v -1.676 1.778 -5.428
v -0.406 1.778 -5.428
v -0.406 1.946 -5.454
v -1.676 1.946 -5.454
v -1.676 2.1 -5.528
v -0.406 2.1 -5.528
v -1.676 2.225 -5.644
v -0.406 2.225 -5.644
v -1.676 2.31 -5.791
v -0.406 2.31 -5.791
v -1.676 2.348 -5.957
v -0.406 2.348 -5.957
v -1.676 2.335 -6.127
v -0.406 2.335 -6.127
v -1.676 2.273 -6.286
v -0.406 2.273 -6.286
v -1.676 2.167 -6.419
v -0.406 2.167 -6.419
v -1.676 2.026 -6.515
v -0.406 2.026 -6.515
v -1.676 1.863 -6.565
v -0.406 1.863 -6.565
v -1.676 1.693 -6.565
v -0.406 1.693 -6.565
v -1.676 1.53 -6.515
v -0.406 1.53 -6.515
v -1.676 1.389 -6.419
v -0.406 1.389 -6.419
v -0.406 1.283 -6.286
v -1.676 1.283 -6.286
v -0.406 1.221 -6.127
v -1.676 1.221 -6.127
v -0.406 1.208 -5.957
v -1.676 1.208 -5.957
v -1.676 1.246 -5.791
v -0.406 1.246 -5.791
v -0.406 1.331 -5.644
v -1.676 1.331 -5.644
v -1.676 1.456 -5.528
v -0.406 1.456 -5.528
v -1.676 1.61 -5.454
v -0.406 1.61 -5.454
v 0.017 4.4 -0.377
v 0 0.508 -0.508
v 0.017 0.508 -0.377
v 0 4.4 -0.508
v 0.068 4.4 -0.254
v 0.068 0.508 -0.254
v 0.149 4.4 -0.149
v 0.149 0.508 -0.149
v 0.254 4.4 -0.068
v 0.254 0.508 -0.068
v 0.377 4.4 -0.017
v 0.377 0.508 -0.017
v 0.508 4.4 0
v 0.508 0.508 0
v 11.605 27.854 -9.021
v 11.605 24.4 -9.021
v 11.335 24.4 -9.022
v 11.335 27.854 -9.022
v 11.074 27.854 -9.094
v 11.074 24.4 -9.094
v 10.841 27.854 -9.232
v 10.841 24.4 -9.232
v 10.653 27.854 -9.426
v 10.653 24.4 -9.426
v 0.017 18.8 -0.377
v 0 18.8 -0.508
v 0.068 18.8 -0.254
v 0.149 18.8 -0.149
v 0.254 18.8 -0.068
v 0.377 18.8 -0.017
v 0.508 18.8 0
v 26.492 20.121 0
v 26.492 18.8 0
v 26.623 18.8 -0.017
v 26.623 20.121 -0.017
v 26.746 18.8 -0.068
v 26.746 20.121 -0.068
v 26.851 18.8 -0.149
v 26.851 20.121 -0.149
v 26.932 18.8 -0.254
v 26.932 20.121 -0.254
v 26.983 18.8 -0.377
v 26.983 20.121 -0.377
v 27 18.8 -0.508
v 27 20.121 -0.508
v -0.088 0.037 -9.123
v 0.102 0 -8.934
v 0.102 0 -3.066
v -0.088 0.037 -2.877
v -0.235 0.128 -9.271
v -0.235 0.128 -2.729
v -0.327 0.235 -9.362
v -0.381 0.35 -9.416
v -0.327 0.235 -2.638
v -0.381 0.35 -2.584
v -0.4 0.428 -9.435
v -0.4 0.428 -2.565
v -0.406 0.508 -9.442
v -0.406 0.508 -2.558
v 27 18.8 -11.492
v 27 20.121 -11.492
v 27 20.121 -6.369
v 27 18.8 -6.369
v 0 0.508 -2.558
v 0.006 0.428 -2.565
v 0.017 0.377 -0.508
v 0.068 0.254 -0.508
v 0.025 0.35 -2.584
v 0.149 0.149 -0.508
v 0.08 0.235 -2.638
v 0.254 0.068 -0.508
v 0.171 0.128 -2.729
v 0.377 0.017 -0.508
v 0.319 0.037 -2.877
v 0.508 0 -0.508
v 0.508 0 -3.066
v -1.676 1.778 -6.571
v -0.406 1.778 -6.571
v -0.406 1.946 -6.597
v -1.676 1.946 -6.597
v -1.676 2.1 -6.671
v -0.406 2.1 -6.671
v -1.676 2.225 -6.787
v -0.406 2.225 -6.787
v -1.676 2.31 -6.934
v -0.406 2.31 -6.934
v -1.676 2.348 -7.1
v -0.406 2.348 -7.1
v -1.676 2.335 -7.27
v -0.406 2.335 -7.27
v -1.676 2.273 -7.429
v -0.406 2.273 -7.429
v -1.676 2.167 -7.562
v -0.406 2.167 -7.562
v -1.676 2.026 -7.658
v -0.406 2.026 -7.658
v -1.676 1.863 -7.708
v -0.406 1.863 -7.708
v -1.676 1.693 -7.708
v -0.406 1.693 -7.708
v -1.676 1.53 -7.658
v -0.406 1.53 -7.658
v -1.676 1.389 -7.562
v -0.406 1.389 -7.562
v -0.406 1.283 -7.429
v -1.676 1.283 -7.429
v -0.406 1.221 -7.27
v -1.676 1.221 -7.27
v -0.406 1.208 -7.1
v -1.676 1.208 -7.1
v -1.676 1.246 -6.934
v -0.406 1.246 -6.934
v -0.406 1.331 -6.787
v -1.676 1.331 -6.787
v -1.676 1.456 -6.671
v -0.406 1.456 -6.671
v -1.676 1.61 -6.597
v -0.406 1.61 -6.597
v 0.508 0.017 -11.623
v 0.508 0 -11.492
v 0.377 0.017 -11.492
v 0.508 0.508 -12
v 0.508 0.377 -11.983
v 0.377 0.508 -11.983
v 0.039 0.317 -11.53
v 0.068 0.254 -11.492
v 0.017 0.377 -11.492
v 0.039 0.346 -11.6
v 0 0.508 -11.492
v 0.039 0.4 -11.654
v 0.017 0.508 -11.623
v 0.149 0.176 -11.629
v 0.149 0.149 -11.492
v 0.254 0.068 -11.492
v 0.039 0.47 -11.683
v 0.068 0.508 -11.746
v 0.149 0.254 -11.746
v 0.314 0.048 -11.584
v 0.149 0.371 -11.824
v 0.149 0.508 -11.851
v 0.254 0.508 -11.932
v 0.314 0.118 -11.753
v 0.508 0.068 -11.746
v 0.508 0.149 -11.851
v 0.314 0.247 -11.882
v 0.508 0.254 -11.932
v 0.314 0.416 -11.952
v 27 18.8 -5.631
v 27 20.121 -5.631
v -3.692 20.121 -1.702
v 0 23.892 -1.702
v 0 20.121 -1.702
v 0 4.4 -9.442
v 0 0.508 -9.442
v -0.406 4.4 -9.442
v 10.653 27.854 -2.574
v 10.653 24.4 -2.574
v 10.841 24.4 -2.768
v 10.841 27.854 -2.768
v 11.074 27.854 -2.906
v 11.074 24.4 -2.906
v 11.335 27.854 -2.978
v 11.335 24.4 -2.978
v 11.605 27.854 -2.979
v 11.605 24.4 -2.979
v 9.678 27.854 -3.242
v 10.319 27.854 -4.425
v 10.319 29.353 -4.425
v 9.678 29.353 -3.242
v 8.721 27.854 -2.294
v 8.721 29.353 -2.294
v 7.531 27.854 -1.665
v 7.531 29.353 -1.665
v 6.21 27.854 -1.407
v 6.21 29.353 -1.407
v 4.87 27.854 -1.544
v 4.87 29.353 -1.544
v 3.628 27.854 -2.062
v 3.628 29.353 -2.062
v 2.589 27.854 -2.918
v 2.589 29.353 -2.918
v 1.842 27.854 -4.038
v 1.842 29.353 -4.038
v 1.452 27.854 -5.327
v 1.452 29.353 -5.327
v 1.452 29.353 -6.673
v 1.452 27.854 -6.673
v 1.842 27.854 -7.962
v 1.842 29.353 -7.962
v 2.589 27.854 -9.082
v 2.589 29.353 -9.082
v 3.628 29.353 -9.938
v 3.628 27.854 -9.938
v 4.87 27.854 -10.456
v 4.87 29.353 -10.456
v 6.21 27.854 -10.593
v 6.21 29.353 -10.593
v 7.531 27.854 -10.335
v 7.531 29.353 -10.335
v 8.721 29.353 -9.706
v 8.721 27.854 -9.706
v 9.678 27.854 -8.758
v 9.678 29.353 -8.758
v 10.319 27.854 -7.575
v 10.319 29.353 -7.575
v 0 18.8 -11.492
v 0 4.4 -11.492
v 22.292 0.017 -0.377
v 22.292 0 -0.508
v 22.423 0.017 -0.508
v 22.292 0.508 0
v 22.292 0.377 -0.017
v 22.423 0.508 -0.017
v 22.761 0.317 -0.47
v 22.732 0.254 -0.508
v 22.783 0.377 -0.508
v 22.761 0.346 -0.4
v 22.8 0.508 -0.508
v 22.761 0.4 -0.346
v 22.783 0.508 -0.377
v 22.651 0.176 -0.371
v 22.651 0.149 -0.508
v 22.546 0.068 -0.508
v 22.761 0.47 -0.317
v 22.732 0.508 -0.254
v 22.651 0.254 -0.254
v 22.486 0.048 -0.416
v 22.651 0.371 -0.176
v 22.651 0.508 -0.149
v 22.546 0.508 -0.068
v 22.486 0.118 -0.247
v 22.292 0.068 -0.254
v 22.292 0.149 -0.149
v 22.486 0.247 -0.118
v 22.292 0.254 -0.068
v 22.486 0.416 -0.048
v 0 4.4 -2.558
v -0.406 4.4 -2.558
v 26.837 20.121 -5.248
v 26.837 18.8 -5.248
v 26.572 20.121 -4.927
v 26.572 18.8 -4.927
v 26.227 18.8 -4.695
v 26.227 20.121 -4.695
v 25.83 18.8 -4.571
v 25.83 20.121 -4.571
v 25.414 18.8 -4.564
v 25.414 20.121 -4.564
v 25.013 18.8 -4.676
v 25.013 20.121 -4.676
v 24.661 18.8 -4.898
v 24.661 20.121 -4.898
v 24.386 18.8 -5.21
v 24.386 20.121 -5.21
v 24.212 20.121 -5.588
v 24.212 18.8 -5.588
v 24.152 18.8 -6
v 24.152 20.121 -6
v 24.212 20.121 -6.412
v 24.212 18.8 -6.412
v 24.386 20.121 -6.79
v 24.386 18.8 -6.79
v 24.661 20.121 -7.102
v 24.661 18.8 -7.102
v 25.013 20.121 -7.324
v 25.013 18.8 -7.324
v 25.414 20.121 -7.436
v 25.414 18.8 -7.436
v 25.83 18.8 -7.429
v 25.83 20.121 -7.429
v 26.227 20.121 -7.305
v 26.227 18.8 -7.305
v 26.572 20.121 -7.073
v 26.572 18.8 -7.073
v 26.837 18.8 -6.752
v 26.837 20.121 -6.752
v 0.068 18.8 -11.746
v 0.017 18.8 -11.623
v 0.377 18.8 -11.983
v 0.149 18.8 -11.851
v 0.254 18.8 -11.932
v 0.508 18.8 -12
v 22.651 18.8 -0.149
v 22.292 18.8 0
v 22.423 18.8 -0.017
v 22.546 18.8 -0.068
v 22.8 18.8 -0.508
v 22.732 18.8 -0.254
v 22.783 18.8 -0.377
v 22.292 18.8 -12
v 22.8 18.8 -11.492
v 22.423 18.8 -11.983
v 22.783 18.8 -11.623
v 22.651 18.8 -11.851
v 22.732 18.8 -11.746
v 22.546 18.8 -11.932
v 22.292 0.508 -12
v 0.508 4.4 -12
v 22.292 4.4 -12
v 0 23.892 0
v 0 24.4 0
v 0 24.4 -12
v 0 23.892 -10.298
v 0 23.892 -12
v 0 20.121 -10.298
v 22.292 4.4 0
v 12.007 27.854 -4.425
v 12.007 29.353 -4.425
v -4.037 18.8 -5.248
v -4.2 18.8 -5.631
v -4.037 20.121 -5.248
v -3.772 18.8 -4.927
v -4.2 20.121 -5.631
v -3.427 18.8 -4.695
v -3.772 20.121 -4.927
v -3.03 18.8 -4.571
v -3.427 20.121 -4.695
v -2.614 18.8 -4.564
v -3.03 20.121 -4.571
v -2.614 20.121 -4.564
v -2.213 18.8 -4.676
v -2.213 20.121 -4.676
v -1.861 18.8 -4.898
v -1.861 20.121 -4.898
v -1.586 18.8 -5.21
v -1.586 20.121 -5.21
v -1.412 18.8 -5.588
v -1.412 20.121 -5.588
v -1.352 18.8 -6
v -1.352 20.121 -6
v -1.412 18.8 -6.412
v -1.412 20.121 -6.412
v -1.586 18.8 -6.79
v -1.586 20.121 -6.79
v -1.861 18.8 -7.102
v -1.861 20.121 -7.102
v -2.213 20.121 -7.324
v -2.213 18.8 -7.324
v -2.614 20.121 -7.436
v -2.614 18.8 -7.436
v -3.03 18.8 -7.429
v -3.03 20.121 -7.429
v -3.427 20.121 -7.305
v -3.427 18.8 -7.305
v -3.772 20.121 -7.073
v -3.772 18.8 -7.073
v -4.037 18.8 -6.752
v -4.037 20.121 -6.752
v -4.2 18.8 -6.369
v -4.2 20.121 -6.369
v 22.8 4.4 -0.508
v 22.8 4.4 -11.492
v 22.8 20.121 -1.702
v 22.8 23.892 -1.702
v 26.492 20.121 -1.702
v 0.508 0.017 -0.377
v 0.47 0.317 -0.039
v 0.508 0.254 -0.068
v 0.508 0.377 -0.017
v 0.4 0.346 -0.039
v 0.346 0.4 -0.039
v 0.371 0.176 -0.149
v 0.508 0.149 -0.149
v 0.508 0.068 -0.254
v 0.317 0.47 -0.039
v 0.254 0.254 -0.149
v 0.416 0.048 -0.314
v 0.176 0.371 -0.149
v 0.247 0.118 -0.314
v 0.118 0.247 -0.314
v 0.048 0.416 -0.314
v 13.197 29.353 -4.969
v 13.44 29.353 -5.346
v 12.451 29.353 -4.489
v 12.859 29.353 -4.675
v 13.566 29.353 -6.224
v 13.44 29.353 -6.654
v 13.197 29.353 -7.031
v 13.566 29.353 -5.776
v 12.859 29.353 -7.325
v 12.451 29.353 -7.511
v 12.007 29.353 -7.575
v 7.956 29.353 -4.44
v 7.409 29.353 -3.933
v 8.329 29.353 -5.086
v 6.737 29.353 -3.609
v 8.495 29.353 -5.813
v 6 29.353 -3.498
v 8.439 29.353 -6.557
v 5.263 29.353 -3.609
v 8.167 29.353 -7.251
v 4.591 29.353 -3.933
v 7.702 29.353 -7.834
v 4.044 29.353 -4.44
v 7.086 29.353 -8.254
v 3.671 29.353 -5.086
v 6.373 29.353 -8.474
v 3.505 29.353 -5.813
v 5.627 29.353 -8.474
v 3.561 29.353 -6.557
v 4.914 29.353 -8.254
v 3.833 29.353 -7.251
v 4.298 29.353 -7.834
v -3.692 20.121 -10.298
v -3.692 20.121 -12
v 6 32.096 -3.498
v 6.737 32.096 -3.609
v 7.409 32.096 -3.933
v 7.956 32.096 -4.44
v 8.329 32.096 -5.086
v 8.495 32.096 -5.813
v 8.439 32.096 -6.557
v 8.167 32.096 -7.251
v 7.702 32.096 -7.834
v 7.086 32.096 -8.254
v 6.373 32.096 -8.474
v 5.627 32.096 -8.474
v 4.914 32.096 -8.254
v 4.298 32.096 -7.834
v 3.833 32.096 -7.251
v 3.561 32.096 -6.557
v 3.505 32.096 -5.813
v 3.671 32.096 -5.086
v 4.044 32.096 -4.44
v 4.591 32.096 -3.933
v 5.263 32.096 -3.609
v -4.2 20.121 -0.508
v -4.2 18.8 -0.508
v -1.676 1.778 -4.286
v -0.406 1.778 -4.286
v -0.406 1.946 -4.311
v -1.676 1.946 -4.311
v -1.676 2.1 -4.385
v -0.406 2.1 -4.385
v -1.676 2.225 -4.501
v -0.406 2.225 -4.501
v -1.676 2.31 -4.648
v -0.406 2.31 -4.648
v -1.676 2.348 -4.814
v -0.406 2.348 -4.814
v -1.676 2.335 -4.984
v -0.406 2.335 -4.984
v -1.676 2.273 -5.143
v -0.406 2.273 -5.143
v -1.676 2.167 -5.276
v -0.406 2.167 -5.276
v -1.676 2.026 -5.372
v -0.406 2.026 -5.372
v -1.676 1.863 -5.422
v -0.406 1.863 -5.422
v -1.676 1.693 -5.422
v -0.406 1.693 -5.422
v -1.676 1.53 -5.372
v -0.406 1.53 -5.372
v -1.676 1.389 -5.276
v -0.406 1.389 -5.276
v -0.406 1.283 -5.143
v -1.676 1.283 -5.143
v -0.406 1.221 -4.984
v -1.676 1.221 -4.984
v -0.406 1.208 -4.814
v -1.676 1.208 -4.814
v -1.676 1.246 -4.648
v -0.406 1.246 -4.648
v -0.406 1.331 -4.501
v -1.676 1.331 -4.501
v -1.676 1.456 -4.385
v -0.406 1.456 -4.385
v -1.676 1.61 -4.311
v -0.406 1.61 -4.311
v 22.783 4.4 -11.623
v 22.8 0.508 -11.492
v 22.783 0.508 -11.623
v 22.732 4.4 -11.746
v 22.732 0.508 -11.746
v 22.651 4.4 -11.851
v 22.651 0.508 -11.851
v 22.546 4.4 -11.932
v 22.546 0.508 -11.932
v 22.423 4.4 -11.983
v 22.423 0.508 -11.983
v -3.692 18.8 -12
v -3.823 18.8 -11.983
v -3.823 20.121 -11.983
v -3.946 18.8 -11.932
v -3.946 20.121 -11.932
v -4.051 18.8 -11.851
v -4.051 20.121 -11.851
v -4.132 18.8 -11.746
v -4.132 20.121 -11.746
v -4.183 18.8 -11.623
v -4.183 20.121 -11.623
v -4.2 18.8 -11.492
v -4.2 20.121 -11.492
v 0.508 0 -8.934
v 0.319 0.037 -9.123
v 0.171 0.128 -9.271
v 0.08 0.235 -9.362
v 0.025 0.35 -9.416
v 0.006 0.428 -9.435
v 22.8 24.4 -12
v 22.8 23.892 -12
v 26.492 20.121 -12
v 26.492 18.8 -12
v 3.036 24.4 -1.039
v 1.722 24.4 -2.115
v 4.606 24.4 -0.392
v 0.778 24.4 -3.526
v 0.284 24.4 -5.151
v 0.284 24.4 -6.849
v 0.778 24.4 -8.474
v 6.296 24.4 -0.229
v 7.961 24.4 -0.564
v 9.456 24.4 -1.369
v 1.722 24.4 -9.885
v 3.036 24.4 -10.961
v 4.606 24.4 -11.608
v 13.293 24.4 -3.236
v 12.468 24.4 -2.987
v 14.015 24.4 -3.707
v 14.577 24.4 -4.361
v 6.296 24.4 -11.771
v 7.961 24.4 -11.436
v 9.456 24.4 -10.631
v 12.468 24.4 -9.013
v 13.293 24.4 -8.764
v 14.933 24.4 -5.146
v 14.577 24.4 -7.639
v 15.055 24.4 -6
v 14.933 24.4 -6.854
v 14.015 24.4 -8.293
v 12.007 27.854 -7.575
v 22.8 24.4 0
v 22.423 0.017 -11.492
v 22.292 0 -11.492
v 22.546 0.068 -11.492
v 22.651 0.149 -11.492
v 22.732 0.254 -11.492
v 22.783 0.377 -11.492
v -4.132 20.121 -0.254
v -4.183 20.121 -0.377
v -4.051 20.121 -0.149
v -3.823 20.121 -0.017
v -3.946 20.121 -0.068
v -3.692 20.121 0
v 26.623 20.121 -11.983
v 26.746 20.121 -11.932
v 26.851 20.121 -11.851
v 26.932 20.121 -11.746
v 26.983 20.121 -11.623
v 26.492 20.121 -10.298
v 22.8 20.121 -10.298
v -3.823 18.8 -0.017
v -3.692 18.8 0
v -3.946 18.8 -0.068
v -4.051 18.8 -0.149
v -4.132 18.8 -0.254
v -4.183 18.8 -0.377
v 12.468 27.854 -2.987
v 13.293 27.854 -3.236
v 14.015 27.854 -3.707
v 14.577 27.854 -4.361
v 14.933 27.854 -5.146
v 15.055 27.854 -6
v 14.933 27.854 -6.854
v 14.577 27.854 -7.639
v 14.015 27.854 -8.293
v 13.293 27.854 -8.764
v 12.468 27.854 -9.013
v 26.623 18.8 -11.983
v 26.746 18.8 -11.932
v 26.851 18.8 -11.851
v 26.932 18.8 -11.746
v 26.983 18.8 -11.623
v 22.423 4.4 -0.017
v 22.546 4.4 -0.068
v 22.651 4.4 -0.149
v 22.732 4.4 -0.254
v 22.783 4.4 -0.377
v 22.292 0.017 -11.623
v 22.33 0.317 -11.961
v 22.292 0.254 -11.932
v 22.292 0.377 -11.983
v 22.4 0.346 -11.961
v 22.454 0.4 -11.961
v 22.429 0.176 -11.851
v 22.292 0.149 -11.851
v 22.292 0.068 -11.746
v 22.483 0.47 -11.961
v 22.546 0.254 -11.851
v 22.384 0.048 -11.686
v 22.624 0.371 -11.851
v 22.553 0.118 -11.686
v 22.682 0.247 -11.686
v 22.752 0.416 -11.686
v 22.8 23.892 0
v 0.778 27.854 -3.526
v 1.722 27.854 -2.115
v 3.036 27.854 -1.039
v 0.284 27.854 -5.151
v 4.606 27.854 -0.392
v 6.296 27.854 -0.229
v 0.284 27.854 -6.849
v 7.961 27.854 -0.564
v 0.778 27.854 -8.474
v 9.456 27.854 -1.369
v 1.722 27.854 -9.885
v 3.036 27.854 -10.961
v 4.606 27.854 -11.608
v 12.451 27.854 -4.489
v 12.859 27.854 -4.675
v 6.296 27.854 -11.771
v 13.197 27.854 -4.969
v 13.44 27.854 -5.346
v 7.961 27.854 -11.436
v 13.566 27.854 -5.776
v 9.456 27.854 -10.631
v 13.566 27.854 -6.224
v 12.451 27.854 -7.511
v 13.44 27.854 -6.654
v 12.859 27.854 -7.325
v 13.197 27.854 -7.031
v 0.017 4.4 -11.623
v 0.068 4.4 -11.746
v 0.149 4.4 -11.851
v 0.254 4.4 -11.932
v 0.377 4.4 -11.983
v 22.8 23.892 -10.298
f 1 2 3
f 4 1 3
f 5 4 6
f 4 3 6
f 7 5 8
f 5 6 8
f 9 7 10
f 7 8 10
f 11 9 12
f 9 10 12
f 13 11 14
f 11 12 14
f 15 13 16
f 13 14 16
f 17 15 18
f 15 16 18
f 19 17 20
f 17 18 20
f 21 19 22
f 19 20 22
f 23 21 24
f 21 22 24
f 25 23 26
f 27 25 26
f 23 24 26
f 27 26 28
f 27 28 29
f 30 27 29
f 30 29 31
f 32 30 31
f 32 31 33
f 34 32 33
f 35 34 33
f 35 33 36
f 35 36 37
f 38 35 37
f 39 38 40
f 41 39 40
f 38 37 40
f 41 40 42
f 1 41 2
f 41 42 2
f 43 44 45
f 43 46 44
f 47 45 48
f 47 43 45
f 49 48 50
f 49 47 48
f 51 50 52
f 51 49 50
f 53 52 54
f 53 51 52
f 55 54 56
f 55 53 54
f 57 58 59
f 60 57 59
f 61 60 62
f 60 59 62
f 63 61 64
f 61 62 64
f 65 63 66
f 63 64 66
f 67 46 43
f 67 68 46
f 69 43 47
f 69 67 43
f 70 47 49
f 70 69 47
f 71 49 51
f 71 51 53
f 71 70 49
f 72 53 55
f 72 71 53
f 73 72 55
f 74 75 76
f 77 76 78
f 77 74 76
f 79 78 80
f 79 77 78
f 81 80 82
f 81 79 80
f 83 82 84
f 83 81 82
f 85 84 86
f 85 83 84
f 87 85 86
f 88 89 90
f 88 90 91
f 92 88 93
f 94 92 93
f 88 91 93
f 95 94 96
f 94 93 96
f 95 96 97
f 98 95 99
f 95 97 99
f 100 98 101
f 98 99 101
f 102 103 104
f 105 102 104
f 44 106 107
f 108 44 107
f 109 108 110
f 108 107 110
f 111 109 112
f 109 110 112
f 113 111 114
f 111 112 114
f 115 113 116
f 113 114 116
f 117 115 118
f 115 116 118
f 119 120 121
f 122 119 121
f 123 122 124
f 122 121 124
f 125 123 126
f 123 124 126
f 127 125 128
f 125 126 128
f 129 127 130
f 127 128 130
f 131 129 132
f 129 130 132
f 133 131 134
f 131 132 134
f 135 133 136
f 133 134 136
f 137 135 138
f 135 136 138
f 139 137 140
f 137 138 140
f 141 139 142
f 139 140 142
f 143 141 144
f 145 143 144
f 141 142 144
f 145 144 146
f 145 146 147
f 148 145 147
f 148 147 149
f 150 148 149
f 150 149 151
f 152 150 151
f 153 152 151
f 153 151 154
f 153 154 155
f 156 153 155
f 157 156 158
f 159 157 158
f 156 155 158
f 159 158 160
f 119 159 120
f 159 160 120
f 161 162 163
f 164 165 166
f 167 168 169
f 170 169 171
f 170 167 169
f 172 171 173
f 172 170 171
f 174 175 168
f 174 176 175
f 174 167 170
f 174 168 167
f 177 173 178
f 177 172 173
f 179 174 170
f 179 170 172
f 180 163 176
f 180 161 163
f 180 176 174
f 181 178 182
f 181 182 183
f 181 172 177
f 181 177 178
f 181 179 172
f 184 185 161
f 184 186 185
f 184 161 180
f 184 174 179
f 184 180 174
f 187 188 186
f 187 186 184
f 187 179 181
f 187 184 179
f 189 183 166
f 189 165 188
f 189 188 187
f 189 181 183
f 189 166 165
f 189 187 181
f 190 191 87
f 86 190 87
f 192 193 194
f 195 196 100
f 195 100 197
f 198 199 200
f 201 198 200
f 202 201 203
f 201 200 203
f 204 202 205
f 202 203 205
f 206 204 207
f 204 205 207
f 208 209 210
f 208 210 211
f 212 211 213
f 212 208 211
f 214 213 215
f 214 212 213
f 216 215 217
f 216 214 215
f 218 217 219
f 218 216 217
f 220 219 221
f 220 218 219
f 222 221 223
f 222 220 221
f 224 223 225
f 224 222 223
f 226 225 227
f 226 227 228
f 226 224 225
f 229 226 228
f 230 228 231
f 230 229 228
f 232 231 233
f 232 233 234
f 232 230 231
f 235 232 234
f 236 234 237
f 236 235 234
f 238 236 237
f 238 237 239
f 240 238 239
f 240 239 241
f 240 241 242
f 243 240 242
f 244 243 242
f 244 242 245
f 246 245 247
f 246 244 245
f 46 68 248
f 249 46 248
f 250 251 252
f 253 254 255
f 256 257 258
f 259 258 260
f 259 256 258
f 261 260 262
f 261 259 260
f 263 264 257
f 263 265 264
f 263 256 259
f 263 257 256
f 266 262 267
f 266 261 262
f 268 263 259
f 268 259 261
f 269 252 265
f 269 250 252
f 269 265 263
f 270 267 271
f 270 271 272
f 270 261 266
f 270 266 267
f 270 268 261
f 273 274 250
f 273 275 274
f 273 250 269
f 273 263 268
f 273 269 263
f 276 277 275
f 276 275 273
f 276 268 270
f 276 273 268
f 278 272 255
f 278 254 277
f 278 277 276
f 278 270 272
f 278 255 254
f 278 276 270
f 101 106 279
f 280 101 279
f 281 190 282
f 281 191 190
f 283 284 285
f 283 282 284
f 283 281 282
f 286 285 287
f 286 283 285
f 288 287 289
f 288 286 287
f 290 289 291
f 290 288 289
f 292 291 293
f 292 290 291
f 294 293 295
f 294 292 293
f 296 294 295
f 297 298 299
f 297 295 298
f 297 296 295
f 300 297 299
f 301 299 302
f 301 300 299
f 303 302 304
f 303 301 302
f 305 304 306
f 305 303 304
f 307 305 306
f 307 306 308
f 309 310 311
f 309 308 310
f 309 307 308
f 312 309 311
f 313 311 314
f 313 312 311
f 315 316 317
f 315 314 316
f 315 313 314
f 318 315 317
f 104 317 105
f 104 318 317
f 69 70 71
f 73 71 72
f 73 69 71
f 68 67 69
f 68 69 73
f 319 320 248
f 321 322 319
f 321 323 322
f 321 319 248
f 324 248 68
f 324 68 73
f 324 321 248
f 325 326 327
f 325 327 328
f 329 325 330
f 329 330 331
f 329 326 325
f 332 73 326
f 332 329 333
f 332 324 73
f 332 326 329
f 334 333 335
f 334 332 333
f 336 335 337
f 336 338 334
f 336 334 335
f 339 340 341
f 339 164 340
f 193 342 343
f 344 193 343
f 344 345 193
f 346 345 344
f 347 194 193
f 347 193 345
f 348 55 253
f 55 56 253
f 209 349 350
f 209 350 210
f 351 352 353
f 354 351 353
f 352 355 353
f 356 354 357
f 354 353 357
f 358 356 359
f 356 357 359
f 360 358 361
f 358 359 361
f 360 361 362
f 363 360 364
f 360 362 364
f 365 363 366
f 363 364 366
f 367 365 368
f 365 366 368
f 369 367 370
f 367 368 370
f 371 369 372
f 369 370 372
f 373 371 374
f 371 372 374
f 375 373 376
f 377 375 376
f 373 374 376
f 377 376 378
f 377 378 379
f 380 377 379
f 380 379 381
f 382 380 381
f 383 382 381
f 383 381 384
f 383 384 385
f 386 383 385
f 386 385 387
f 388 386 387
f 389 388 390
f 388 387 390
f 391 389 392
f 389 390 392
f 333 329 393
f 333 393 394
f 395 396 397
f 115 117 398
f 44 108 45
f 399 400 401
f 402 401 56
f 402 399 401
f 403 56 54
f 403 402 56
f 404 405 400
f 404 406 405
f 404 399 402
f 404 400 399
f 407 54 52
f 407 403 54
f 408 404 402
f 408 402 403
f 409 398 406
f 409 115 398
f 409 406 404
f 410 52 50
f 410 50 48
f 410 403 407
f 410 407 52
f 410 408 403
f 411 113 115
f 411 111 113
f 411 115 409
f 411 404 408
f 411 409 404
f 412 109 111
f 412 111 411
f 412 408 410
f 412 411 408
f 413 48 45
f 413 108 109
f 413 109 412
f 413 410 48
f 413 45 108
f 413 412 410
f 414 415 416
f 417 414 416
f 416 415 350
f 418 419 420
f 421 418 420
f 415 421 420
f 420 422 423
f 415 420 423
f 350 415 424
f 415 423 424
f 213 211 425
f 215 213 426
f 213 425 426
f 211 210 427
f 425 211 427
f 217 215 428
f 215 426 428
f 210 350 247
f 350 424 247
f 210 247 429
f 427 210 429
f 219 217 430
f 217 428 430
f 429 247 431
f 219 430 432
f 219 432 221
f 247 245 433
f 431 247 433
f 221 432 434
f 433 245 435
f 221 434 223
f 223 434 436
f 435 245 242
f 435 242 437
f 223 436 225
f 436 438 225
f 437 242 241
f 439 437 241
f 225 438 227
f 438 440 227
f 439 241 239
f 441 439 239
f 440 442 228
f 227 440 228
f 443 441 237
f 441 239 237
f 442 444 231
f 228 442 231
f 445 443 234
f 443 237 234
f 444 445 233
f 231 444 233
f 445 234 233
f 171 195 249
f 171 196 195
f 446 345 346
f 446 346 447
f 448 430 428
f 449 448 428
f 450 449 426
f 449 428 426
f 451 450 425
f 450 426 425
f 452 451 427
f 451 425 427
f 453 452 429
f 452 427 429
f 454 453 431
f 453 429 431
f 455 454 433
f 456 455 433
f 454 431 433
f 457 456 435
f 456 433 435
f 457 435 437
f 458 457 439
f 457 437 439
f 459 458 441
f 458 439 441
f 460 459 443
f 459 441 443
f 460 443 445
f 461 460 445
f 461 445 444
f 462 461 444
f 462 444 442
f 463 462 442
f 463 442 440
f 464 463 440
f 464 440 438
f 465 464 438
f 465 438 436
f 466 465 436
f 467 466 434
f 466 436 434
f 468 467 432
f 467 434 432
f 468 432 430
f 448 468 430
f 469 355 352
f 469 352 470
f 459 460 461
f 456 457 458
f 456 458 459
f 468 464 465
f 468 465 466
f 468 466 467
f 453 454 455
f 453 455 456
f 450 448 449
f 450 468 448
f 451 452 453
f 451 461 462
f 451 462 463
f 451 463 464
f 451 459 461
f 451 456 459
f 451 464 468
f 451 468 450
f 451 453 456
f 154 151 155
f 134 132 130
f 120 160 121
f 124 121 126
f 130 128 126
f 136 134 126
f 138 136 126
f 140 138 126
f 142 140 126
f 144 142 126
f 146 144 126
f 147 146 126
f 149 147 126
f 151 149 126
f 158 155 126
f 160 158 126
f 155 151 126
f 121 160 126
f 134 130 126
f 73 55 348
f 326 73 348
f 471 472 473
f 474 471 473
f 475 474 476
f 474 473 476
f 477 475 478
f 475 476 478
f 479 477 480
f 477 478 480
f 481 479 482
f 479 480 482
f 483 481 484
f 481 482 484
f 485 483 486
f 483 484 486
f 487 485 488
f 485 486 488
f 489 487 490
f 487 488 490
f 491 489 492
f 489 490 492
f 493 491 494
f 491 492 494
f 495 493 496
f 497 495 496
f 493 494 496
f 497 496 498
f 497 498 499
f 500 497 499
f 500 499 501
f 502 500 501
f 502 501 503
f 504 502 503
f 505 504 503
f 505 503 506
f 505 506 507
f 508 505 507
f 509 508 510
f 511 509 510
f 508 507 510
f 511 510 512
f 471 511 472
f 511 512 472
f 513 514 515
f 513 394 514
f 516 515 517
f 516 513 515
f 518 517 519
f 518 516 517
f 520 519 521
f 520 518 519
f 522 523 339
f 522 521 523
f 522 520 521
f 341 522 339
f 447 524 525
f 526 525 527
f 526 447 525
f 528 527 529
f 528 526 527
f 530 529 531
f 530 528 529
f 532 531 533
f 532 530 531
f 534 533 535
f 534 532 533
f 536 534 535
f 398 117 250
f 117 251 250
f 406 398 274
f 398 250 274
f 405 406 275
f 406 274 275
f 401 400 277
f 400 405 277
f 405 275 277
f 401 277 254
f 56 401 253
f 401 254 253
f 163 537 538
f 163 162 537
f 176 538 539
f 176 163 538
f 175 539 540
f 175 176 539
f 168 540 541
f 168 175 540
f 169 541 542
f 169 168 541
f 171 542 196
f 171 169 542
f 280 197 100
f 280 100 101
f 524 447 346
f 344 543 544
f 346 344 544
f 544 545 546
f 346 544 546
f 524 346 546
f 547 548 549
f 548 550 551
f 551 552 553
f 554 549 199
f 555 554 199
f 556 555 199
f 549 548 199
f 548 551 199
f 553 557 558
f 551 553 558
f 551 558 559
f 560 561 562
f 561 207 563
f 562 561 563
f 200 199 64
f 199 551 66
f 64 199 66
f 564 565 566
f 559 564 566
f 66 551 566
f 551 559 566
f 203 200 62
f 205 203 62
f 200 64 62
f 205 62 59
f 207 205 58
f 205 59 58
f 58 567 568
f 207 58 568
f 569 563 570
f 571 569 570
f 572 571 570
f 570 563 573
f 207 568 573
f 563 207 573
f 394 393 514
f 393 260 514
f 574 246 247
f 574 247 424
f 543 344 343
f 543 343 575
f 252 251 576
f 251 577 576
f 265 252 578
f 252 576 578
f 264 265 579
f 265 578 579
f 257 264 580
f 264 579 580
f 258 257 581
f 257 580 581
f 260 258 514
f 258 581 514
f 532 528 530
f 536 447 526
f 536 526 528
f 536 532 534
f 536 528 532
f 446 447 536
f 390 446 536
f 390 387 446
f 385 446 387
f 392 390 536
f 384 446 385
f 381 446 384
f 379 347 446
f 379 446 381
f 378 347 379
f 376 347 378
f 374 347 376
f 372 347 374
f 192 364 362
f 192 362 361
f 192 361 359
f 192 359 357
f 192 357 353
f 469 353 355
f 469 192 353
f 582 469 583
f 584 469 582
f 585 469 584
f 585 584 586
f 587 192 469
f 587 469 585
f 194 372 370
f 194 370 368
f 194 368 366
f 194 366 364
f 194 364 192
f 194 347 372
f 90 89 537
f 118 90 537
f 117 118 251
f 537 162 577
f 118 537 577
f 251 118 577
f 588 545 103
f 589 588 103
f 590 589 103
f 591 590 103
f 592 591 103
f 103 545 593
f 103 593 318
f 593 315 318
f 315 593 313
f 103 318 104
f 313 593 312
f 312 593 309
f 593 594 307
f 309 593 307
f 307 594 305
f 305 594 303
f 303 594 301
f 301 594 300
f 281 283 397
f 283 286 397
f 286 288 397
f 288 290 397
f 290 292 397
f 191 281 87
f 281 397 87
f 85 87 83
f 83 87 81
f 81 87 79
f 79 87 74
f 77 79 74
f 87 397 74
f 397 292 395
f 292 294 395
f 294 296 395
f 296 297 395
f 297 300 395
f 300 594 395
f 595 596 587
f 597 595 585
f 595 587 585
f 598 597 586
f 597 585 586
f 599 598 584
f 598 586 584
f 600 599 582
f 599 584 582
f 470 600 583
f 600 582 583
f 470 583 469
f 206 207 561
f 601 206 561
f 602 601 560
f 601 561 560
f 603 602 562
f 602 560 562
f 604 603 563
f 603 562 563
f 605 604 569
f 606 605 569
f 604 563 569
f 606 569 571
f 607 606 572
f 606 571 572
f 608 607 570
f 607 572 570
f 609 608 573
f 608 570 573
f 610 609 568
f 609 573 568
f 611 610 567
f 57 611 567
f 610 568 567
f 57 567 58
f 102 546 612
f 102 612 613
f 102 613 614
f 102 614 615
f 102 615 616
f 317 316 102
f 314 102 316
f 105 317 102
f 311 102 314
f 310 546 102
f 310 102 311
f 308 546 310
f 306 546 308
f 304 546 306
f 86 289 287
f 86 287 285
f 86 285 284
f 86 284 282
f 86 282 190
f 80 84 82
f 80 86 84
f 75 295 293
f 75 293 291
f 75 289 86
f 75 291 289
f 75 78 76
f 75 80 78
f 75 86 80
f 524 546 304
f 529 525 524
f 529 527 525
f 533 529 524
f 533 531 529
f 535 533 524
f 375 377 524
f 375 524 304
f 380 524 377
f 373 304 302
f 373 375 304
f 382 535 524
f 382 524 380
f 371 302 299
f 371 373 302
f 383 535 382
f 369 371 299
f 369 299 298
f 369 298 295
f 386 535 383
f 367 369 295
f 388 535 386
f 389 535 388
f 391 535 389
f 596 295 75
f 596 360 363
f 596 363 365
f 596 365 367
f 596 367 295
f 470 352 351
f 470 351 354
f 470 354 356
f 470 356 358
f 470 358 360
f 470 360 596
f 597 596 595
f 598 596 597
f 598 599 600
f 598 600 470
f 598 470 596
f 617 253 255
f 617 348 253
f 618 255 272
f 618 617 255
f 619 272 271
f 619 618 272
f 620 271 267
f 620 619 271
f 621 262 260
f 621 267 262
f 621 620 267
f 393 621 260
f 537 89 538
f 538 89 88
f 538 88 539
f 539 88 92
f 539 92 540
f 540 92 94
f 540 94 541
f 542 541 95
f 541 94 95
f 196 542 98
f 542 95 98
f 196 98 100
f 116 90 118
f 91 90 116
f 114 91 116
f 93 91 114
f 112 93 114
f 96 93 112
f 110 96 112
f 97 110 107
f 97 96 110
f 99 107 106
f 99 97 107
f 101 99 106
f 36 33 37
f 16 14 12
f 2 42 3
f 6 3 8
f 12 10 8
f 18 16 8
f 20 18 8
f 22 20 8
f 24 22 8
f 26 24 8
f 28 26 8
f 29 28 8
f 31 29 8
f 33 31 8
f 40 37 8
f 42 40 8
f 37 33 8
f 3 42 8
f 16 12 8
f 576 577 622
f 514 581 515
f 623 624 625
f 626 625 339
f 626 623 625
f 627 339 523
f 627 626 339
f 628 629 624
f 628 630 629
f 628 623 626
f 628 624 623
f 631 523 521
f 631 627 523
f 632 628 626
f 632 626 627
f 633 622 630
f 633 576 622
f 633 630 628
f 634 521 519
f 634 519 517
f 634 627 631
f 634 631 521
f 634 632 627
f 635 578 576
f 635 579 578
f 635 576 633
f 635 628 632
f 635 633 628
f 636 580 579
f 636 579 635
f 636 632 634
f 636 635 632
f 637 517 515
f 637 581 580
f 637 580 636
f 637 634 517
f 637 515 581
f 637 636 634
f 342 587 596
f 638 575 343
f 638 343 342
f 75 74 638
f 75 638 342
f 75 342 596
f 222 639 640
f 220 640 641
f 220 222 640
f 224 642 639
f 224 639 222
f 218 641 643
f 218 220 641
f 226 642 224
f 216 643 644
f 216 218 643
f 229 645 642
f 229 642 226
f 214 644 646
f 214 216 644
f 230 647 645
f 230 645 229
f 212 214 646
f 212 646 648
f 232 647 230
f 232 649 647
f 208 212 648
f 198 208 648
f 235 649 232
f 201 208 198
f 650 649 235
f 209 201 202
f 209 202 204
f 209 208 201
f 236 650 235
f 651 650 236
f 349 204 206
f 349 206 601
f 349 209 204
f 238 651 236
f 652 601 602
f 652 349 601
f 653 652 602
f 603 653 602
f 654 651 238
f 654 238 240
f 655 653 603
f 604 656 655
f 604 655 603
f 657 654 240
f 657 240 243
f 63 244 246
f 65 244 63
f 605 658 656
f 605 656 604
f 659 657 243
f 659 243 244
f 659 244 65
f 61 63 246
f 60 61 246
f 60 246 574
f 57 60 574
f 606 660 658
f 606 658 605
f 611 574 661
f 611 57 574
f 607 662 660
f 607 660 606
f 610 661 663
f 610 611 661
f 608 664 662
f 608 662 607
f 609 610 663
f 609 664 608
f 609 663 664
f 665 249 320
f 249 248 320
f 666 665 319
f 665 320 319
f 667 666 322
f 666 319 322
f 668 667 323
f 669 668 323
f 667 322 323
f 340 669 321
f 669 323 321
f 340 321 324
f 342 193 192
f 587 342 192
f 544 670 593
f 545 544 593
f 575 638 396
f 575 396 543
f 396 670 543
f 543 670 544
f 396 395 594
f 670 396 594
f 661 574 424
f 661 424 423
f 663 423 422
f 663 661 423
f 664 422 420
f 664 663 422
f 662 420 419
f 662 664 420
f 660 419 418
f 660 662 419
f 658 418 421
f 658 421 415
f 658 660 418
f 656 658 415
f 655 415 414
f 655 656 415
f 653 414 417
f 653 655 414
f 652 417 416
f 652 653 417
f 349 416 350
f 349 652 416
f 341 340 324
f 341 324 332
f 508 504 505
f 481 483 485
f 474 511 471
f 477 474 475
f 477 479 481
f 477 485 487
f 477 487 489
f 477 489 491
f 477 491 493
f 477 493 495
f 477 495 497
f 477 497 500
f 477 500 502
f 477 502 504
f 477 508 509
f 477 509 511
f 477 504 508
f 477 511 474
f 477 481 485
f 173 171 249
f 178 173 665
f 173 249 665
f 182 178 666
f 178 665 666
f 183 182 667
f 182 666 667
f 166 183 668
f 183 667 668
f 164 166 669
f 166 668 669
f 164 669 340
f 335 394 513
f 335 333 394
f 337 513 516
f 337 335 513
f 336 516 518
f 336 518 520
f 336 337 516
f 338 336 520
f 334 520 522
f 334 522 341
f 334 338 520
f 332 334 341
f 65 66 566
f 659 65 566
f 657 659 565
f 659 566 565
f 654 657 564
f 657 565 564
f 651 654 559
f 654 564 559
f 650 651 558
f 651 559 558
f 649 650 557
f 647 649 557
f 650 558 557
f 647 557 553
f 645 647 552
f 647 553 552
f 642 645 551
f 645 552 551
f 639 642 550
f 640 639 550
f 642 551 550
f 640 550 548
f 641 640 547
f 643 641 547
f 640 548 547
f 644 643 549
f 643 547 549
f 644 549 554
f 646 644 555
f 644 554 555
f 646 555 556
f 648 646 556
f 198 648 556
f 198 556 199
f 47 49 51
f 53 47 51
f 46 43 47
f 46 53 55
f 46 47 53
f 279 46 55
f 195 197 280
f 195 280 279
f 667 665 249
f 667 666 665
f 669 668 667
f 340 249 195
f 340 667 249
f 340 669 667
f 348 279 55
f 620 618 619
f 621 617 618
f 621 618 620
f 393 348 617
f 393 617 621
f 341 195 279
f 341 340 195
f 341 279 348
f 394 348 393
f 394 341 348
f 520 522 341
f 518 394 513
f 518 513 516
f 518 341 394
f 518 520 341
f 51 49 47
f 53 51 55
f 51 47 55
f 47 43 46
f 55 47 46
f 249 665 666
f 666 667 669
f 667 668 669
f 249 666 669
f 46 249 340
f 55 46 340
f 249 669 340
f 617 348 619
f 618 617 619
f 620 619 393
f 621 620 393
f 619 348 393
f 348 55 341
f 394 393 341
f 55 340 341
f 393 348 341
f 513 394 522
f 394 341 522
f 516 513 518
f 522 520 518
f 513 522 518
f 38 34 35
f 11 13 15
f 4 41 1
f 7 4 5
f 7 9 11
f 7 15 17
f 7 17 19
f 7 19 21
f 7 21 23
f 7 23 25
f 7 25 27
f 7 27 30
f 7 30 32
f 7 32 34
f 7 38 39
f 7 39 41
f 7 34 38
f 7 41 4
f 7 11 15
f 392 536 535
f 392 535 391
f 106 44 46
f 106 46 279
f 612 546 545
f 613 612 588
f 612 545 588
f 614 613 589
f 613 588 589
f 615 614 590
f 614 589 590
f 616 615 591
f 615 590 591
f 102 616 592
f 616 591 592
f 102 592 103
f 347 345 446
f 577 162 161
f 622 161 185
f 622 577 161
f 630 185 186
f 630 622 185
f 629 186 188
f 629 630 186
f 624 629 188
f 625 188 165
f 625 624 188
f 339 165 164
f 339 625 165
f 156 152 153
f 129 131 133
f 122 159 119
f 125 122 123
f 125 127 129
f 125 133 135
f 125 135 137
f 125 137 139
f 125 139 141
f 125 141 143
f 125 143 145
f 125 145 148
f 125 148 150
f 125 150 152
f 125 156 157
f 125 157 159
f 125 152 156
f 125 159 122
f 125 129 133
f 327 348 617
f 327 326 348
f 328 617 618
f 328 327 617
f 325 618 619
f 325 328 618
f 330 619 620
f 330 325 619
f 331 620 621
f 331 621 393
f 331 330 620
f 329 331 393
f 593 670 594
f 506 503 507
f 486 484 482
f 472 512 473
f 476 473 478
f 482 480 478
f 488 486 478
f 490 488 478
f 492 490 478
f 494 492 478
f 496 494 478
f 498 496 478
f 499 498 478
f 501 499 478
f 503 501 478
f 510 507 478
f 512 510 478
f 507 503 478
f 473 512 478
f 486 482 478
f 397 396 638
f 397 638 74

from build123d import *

# Parameters (mm, degrees)
SKETCH1_W               = 22.8
SKETCH1_H               = 12
BOSS_EXTRUDE1_DEPTH     = 4.4
SKETCH2_W               = 22.8
SKETCH2_H               = 12
BOSS_EXTRUDE4_DEPTH     = 14.4
SKETCH5_W               = 22.8
SKETCH5_H               = 12
BOSS_EXTRUDE6_DEPTH     = 5.6
SKETCH7_W               = 12
SKETCH7_H               = 1.3208
BOSS_EXTRUDE9_DEPTH     = 4.2
RIB7_REACH              = 37.485
SKETCH9_WALL_W          = 78.247992846
SKETCH9_WALL_H          = 1.7018
SKETCH10_R              = 1.4478
CUT_EXTRUDE1_DEPTH      = 1.3208
MIRROR2_COPY_1_REACH    = 37.485
MIRROR2_COPY_1_SKETCH_W = 78.247992846
MIRROR2_COPY_1_SKETCH_H = 1.7018
BOSS_EXTRUDE10_DEPTH    = 3.4544
FILLET1_R               = 0.508
FILLET3_R               = 0.508
BOSS_EXTRUDE11_DEPTH    = 1.4986
SKETCH13_R              = 2.5019
BOSS_EXTRUDE12_DEPTH    = 2.7432
SKETCH14_W              = 6.8834
SKETCH14_H              = 4.4
BOSS_EXTRUDE14_DEPTH    = 0.4064
SKETCH15_R              = 0.5715
BOSS_EXTRUDE15_DEPTH    = 1.27
BOSS_EXTRUDE15_2_DEPTH  = 1.27
BOSS_EXTRUDE15_3_DEPTH  = 1.27
FILLET4_R               = 0.508


with BuildPart() as part:
    # Sketch1 → Boss-Extrude1 (new body)
    with BuildSketch(Plane(origin=(0, 0, 0), x_dir=(1, 0, 0), z_dir=(0, 1, 0))):
        with Locations((11.4, 6)):
            Rectangle(SKETCH1_W, SKETCH1_H)
    extrude(amount=BOSS_EXTRUDE1_DEPTH)

    # Sketch14 → Boss-Extrude14 (add)
    with BuildSketch(Plane.ZY):
        with Locations((-6, 2.2)):
            Rectangle(SKETCH14_W, SKETCH14_H)
    extrude(amount=BOSS_EXTRUDE14_DEPTH)

    # Fillet4
    fillet4_edges = [part.edges().sort_by_distance(p)[0] for p in [
        (-0.2032, 0, -9.4417),
        (-0.4064, 0, -6),
        (-0.2032, 0, -2.5583),
        (0, 0, -1.27915),
        (11.4, 0, 0),
        (22.8, 0, -6),
        (11.4, 0, -12),
        (0, 0, -10.72085),
        (0, 2.2, 0),
        (22.8, 2.2, 0),
        (22.8, 2.2, -12),
        (0, 2.2, -12),
    ]]
    fillet(fillet4_edges, radius=FILLET4_R)


with BuildPart() as body_2:
    # Sketch2 → Boss-Extrude4 (new body)
    with BuildSketch(Plane(origin=(0, 4.4, 0), x_dir=(1, 0, 0), z_dir=(0, 1, 0))):
        with Locations((11.4, 6)):
            Rectangle(SKETCH2_W, SKETCH2_H)
    extrude(amount=BOSS_EXTRUDE4_DEPTH)

    # Fillet1
    fillet1_edges = [body_2.edges().sort_by_distance(p)[0] for p in [
        (0, 11.6, -12),
        (22.8, 11.6, -12),
        (22.8, 11.6, 0),
        (0, 11.6, 0),
    ]]
    fillet(fillet1_edges, radius=FILLET1_R)


with BuildPart() as body_3:
    # Sketch5 → Boss-Extrude6 (new body)
    with BuildSketch(Plane(origin=(0, 18.8, 0), x_dir=(1, 0, 0), z_dir=(0, 1, 0))):
        with Locations((11.4, 6)):
            Rectangle(SKETCH5_W, SKETCH5_H)
    extrude(amount=BOSS_EXTRUDE6_DEPTH)

    # Sketch7 → Boss-Extrude9 (add)
    with BuildSketch(Plane.ZY):
        with Locations((-6, 19.4604)):
            Rectangle(SKETCH7_W, SKETCH7_H)
    boss_extrude9 = extrude(amount=BOSS_EXTRUDE9_DEPTH)

    # Sketch9 wall → Rib7 (add, up to next)
    with BuildSketch(Plane(origin=(-1.846, 22.0064, 0), x_dir=(-0.699563524682, -0.71457041286, 0), z_dir=(0.71457041286, -0.699563524682, 0)), mode=Mode.PRIVATE) as rib7_sk1:
        with Locations((0, 0.8509)):
            Rectangle(SKETCH9_WALL_W, SKETCH9_WALL_H)
    rib7_tool1 = extrude(rib7_sk1.sketch, amount=RIB7_REACH, mode=Mode.PRIVATE) - body_3.part
    rib7 = rib7_tool1.solids().sort_by_distance((-1.846, 22.0064, 0))[0]
    add(rib7)

    # Mirror1: Rib7 across plane
    add(rib7.mirror(Plane(origin=(0, 0, -6), x_dir=(1, 0, 0), z_dir=(0, 0, -1))))

    # Sketch10 → Cut-Extrude1 (cut)
    with BuildSketch(Plane(origin=(0, 20.1208, 0), x_dir=(1, 0, 0), z_dir=(0, 1, 0))):
        with Locations((-2.8, 6)):
            Circle(SKETCH10_R)
    cut_extrude1 = extrude(amount=-CUT_EXTRUDE1_DEPTH, mode=Mode.SUBTRACT)

    # Mirror2: Boss-Extrude9, Rib7, Cut-Extrude1 across plane
    add(boss_extrude9.mirror(Plane.ZY.offset(-11.4)))
    add(rib7.mirror(Plane.ZY.offset(-11.4)))
    add(cut_extrude1.mirror(Plane.ZY.offset(-11.4)), mode=Mode.SUBTRACT)

    # Mirror2 copy 1 sketch → Mirror2 copy 1 (add, up to next)
    with BuildSketch(Plane(origin=(24.646, 22.0064, -12), x_dir=(0.699563524682, -0.71457041286, 0), z_dir=(-0.71457041286, -0.699563524682, 0)), mode=Mode.PRIVATE) as mirror2_copy_1_sk1:
        with Locations((0, 0.8509)):
            Rectangle(MIRROR2_COPY_1_SKETCH_W, MIRROR2_COPY_1_SKETCH_H)
    mirror2_copy_1_tool1 = extrude(mirror2_copy_1_sk1.sketch, amount=MIRROR2_COPY_1_REACH, mode=Mode.PRIVATE) - body_3.part
    add(mirror2_copy_1_tool1.solids().sort_by_distance((24.646, 22.0064, -12))[0])

    # Fillet3
    fillet3_edges = [body_3.edges().sort_by_distance(p)[0] for p in [
        (-4.2, 19.4604, 0),
        (-4.2, 19.4604, -12),
        (27, 19.4604, -12),
        (27, 19.4604, 0),
    ]]
    fillet(fillet3_edges, radius=FILLET3_R)


with BuildPart() as body_4:
    # Sketch11 → Boss-Extrude10 (new body)
    with BuildSketch(Plane(origin=(0, 24.4, 0), x_dir=(1, 0, 0), z_dir=(0, 1, 0))):
        with BuildLine():
            ThreePointArc((10.653238997, 9.426139093), (0.2215, 6), (10.653238997, 2.573860907))
            ThreePointArc((10.653238997, 2.573860907), (11.073906709, 2.906482777), (11.605318182, 2.978597119))
            ThreePointArc((11.605318182, 2.978597119), (15.0551, 6), (11.605318182, 9.021402881))
            ThreePointArc((11.605318182, 9.021402881), (11.073906709, 9.093517223), (10.653238997, 9.426139093))
        make_face()
    extrude(amount=BOSS_EXTRUDE10_DEPTH)

    # Sketch12 → Boss-Extrude11 (add)
    with BuildSketch(Plane(origin=(0, 27.8544, 0), x_dir=(1, 0, 0), z_dir=(0, 1, 0))):
        with BuildLine():
            Line((12.0071, 4.4252), (10.319269813, 4.4252))
            ThreePointArc((10.319269813, 4.4252), (1.4026, 6), (10.319269813, 7.5748))
            Line((10.319269813, 7.5748), (12.0071, 7.5748))
            ThreePointArc((12.0071, 7.5748), (13.5819, 6), (12.0071, 4.4252))
        make_face()
    extrude(amount=BOSS_EXTRUDE11_DEPTH)

    # Sketch13 → Boss-Extrude12 (add)
    with BuildSketch(Plane(origin=(0, 29.353, 0), x_dir=(1, 0, 0), z_dir=(0, 1, 0))):
        with Locations(Location((6, 6, 0), (0, 0, 270))):
            Circle(SKETCH13_R)
    extrude(amount=BOSS_EXTRUDE12_DEPTH)


with BuildPart() as body_5:
    # Sketch15 → Boss-Extrude15 (new body)
    with BuildSketch(Plane.ZY.offset(0.4064)):
        with Locations((-6, 1.778)):
            Circle(SKETCH15_R)
    extrude(amount=BOSS_EXTRUDE15_DEPTH)


with BuildPart() as body_6:
    # Sketch15 → Boss-Extrude15 2 (new body)
    with BuildSketch(Plane.ZY.offset(0.4064)):
        with Locations((-4.857, 1.778)):
            Circle(SKETCH15_R)
    extrude(amount=BOSS_EXTRUDE15_2_DEPTH)


with BuildPart() as body_7:
    # Sketch15 → Boss-Extrude15 3 (new body)
    with BuildSketch(Plane.ZY.offset(0.4064)):
        with Locations((-7.143, 1.778)):
            Circle(SKETCH15_R)
    extrude(amount=BOSS_EXTRUDE15_3_DEPTH)


solid = Compound([part.part, body_2.part, body_3.part, body_4.part, body_5.part, body_6.part, body_7.part])
